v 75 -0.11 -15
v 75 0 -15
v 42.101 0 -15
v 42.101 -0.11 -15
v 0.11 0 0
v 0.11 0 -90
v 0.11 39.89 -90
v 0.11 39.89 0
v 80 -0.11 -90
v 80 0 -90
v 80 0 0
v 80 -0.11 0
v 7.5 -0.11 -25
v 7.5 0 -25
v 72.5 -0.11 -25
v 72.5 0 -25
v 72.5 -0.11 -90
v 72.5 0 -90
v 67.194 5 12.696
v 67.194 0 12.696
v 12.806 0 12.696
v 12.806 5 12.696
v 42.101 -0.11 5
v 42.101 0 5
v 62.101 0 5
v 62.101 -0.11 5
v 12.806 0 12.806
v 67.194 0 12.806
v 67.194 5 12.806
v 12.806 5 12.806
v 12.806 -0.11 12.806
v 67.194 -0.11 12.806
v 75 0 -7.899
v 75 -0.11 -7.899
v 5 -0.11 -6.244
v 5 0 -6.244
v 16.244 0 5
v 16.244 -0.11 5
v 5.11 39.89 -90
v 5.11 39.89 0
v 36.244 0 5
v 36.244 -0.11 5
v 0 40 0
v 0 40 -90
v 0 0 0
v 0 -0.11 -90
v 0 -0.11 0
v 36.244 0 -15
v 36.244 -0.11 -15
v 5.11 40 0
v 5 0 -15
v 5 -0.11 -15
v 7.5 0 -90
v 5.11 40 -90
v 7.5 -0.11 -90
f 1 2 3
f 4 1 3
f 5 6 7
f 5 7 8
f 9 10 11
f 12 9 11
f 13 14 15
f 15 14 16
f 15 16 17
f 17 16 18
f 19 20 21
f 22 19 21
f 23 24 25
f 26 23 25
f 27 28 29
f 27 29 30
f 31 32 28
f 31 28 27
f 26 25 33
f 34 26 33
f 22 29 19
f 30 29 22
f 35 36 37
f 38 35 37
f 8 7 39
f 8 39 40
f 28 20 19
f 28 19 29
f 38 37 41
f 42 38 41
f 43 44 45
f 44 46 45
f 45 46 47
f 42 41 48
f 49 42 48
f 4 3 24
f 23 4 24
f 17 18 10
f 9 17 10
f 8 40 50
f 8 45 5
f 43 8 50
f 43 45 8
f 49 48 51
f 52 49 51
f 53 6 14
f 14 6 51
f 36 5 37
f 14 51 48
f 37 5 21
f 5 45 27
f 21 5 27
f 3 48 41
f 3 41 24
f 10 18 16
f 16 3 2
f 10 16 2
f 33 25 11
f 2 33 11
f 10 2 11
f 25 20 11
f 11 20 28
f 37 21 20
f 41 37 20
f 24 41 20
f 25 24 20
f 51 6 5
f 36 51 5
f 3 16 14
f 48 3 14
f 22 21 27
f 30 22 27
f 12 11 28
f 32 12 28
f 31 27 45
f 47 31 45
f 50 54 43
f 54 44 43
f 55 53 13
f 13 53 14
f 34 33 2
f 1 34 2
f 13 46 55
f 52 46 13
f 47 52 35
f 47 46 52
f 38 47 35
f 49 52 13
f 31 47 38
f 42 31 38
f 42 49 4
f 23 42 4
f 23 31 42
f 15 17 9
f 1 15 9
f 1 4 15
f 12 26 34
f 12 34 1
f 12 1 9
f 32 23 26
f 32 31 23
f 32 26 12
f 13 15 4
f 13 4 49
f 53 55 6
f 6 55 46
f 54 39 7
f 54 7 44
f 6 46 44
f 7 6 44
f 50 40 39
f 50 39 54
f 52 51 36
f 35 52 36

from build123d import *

# Parameters (mm, degrees)
F1_DEPTH = 0.11
F2_W     = 0.11
F2_H     = 90
F3_DEPTH = 40
F4_W     = 0.11
F4_H     = 90
F5_DEPTH = 5
F6_W     = 54.38837
F6_H     = 0.11
F7_DEPTH = 5


with BuildPart() as f1:
    # F0 (on Front) → F1 (new body)
    with BuildSketch(Plane.XZ):
        Polygon((12.805815, 12.805815), (0, 0), (0, -90), (7.5, -90), (7.5, -25), (72.5, -25), (72.5, -90), (80, -90), (80, 0), (67.194185, 12.805815), align=None)
        Polygon((16.2438, 5), (36.2438, 5), (36.2438, -15), (5, -15), (5, -6.2438), align=None, mode=Mode.SUBTRACT)
        Polygon((42.101238, -15), (42.101238, 5), (62.101238, 5), (75, -7.898762), (75, -15), align=None, mode=Mode.SUBTRACT)
    extrude(amount=F1_DEPTH)

    # F2 (on face) → F3 (join)
    with BuildSketch(Plane(origin=(0, 0, 0), x_dir=(-1, 0, 0), z_dir=(0, 1, 0))):
        with Locations((-0.055, -45)):
            Rectangle(F2_W, F2_H)
    extrude(amount=F3_DEPTH)

    # F4 (on face) → F5 (join)
    with BuildSketch(Plane.YZ.offset(0.11)):
        with Locations((39.945, -45)):
            Rectangle(F4_W, F4_H)
    extrude(amount=F5_DEPTH)

    # F6 (on face) → F7 (join)
    with BuildSketch(Plane(origin=(0, 0, 0), x_dir=(-1, 0, 0), z_dir=(0, 1, 0))):
        with Locations((-40, 12.750815)):
            Rectangle(F6_W, F6_H)
    extrude(amount=F7_DEPTH)


solid = f1.part
